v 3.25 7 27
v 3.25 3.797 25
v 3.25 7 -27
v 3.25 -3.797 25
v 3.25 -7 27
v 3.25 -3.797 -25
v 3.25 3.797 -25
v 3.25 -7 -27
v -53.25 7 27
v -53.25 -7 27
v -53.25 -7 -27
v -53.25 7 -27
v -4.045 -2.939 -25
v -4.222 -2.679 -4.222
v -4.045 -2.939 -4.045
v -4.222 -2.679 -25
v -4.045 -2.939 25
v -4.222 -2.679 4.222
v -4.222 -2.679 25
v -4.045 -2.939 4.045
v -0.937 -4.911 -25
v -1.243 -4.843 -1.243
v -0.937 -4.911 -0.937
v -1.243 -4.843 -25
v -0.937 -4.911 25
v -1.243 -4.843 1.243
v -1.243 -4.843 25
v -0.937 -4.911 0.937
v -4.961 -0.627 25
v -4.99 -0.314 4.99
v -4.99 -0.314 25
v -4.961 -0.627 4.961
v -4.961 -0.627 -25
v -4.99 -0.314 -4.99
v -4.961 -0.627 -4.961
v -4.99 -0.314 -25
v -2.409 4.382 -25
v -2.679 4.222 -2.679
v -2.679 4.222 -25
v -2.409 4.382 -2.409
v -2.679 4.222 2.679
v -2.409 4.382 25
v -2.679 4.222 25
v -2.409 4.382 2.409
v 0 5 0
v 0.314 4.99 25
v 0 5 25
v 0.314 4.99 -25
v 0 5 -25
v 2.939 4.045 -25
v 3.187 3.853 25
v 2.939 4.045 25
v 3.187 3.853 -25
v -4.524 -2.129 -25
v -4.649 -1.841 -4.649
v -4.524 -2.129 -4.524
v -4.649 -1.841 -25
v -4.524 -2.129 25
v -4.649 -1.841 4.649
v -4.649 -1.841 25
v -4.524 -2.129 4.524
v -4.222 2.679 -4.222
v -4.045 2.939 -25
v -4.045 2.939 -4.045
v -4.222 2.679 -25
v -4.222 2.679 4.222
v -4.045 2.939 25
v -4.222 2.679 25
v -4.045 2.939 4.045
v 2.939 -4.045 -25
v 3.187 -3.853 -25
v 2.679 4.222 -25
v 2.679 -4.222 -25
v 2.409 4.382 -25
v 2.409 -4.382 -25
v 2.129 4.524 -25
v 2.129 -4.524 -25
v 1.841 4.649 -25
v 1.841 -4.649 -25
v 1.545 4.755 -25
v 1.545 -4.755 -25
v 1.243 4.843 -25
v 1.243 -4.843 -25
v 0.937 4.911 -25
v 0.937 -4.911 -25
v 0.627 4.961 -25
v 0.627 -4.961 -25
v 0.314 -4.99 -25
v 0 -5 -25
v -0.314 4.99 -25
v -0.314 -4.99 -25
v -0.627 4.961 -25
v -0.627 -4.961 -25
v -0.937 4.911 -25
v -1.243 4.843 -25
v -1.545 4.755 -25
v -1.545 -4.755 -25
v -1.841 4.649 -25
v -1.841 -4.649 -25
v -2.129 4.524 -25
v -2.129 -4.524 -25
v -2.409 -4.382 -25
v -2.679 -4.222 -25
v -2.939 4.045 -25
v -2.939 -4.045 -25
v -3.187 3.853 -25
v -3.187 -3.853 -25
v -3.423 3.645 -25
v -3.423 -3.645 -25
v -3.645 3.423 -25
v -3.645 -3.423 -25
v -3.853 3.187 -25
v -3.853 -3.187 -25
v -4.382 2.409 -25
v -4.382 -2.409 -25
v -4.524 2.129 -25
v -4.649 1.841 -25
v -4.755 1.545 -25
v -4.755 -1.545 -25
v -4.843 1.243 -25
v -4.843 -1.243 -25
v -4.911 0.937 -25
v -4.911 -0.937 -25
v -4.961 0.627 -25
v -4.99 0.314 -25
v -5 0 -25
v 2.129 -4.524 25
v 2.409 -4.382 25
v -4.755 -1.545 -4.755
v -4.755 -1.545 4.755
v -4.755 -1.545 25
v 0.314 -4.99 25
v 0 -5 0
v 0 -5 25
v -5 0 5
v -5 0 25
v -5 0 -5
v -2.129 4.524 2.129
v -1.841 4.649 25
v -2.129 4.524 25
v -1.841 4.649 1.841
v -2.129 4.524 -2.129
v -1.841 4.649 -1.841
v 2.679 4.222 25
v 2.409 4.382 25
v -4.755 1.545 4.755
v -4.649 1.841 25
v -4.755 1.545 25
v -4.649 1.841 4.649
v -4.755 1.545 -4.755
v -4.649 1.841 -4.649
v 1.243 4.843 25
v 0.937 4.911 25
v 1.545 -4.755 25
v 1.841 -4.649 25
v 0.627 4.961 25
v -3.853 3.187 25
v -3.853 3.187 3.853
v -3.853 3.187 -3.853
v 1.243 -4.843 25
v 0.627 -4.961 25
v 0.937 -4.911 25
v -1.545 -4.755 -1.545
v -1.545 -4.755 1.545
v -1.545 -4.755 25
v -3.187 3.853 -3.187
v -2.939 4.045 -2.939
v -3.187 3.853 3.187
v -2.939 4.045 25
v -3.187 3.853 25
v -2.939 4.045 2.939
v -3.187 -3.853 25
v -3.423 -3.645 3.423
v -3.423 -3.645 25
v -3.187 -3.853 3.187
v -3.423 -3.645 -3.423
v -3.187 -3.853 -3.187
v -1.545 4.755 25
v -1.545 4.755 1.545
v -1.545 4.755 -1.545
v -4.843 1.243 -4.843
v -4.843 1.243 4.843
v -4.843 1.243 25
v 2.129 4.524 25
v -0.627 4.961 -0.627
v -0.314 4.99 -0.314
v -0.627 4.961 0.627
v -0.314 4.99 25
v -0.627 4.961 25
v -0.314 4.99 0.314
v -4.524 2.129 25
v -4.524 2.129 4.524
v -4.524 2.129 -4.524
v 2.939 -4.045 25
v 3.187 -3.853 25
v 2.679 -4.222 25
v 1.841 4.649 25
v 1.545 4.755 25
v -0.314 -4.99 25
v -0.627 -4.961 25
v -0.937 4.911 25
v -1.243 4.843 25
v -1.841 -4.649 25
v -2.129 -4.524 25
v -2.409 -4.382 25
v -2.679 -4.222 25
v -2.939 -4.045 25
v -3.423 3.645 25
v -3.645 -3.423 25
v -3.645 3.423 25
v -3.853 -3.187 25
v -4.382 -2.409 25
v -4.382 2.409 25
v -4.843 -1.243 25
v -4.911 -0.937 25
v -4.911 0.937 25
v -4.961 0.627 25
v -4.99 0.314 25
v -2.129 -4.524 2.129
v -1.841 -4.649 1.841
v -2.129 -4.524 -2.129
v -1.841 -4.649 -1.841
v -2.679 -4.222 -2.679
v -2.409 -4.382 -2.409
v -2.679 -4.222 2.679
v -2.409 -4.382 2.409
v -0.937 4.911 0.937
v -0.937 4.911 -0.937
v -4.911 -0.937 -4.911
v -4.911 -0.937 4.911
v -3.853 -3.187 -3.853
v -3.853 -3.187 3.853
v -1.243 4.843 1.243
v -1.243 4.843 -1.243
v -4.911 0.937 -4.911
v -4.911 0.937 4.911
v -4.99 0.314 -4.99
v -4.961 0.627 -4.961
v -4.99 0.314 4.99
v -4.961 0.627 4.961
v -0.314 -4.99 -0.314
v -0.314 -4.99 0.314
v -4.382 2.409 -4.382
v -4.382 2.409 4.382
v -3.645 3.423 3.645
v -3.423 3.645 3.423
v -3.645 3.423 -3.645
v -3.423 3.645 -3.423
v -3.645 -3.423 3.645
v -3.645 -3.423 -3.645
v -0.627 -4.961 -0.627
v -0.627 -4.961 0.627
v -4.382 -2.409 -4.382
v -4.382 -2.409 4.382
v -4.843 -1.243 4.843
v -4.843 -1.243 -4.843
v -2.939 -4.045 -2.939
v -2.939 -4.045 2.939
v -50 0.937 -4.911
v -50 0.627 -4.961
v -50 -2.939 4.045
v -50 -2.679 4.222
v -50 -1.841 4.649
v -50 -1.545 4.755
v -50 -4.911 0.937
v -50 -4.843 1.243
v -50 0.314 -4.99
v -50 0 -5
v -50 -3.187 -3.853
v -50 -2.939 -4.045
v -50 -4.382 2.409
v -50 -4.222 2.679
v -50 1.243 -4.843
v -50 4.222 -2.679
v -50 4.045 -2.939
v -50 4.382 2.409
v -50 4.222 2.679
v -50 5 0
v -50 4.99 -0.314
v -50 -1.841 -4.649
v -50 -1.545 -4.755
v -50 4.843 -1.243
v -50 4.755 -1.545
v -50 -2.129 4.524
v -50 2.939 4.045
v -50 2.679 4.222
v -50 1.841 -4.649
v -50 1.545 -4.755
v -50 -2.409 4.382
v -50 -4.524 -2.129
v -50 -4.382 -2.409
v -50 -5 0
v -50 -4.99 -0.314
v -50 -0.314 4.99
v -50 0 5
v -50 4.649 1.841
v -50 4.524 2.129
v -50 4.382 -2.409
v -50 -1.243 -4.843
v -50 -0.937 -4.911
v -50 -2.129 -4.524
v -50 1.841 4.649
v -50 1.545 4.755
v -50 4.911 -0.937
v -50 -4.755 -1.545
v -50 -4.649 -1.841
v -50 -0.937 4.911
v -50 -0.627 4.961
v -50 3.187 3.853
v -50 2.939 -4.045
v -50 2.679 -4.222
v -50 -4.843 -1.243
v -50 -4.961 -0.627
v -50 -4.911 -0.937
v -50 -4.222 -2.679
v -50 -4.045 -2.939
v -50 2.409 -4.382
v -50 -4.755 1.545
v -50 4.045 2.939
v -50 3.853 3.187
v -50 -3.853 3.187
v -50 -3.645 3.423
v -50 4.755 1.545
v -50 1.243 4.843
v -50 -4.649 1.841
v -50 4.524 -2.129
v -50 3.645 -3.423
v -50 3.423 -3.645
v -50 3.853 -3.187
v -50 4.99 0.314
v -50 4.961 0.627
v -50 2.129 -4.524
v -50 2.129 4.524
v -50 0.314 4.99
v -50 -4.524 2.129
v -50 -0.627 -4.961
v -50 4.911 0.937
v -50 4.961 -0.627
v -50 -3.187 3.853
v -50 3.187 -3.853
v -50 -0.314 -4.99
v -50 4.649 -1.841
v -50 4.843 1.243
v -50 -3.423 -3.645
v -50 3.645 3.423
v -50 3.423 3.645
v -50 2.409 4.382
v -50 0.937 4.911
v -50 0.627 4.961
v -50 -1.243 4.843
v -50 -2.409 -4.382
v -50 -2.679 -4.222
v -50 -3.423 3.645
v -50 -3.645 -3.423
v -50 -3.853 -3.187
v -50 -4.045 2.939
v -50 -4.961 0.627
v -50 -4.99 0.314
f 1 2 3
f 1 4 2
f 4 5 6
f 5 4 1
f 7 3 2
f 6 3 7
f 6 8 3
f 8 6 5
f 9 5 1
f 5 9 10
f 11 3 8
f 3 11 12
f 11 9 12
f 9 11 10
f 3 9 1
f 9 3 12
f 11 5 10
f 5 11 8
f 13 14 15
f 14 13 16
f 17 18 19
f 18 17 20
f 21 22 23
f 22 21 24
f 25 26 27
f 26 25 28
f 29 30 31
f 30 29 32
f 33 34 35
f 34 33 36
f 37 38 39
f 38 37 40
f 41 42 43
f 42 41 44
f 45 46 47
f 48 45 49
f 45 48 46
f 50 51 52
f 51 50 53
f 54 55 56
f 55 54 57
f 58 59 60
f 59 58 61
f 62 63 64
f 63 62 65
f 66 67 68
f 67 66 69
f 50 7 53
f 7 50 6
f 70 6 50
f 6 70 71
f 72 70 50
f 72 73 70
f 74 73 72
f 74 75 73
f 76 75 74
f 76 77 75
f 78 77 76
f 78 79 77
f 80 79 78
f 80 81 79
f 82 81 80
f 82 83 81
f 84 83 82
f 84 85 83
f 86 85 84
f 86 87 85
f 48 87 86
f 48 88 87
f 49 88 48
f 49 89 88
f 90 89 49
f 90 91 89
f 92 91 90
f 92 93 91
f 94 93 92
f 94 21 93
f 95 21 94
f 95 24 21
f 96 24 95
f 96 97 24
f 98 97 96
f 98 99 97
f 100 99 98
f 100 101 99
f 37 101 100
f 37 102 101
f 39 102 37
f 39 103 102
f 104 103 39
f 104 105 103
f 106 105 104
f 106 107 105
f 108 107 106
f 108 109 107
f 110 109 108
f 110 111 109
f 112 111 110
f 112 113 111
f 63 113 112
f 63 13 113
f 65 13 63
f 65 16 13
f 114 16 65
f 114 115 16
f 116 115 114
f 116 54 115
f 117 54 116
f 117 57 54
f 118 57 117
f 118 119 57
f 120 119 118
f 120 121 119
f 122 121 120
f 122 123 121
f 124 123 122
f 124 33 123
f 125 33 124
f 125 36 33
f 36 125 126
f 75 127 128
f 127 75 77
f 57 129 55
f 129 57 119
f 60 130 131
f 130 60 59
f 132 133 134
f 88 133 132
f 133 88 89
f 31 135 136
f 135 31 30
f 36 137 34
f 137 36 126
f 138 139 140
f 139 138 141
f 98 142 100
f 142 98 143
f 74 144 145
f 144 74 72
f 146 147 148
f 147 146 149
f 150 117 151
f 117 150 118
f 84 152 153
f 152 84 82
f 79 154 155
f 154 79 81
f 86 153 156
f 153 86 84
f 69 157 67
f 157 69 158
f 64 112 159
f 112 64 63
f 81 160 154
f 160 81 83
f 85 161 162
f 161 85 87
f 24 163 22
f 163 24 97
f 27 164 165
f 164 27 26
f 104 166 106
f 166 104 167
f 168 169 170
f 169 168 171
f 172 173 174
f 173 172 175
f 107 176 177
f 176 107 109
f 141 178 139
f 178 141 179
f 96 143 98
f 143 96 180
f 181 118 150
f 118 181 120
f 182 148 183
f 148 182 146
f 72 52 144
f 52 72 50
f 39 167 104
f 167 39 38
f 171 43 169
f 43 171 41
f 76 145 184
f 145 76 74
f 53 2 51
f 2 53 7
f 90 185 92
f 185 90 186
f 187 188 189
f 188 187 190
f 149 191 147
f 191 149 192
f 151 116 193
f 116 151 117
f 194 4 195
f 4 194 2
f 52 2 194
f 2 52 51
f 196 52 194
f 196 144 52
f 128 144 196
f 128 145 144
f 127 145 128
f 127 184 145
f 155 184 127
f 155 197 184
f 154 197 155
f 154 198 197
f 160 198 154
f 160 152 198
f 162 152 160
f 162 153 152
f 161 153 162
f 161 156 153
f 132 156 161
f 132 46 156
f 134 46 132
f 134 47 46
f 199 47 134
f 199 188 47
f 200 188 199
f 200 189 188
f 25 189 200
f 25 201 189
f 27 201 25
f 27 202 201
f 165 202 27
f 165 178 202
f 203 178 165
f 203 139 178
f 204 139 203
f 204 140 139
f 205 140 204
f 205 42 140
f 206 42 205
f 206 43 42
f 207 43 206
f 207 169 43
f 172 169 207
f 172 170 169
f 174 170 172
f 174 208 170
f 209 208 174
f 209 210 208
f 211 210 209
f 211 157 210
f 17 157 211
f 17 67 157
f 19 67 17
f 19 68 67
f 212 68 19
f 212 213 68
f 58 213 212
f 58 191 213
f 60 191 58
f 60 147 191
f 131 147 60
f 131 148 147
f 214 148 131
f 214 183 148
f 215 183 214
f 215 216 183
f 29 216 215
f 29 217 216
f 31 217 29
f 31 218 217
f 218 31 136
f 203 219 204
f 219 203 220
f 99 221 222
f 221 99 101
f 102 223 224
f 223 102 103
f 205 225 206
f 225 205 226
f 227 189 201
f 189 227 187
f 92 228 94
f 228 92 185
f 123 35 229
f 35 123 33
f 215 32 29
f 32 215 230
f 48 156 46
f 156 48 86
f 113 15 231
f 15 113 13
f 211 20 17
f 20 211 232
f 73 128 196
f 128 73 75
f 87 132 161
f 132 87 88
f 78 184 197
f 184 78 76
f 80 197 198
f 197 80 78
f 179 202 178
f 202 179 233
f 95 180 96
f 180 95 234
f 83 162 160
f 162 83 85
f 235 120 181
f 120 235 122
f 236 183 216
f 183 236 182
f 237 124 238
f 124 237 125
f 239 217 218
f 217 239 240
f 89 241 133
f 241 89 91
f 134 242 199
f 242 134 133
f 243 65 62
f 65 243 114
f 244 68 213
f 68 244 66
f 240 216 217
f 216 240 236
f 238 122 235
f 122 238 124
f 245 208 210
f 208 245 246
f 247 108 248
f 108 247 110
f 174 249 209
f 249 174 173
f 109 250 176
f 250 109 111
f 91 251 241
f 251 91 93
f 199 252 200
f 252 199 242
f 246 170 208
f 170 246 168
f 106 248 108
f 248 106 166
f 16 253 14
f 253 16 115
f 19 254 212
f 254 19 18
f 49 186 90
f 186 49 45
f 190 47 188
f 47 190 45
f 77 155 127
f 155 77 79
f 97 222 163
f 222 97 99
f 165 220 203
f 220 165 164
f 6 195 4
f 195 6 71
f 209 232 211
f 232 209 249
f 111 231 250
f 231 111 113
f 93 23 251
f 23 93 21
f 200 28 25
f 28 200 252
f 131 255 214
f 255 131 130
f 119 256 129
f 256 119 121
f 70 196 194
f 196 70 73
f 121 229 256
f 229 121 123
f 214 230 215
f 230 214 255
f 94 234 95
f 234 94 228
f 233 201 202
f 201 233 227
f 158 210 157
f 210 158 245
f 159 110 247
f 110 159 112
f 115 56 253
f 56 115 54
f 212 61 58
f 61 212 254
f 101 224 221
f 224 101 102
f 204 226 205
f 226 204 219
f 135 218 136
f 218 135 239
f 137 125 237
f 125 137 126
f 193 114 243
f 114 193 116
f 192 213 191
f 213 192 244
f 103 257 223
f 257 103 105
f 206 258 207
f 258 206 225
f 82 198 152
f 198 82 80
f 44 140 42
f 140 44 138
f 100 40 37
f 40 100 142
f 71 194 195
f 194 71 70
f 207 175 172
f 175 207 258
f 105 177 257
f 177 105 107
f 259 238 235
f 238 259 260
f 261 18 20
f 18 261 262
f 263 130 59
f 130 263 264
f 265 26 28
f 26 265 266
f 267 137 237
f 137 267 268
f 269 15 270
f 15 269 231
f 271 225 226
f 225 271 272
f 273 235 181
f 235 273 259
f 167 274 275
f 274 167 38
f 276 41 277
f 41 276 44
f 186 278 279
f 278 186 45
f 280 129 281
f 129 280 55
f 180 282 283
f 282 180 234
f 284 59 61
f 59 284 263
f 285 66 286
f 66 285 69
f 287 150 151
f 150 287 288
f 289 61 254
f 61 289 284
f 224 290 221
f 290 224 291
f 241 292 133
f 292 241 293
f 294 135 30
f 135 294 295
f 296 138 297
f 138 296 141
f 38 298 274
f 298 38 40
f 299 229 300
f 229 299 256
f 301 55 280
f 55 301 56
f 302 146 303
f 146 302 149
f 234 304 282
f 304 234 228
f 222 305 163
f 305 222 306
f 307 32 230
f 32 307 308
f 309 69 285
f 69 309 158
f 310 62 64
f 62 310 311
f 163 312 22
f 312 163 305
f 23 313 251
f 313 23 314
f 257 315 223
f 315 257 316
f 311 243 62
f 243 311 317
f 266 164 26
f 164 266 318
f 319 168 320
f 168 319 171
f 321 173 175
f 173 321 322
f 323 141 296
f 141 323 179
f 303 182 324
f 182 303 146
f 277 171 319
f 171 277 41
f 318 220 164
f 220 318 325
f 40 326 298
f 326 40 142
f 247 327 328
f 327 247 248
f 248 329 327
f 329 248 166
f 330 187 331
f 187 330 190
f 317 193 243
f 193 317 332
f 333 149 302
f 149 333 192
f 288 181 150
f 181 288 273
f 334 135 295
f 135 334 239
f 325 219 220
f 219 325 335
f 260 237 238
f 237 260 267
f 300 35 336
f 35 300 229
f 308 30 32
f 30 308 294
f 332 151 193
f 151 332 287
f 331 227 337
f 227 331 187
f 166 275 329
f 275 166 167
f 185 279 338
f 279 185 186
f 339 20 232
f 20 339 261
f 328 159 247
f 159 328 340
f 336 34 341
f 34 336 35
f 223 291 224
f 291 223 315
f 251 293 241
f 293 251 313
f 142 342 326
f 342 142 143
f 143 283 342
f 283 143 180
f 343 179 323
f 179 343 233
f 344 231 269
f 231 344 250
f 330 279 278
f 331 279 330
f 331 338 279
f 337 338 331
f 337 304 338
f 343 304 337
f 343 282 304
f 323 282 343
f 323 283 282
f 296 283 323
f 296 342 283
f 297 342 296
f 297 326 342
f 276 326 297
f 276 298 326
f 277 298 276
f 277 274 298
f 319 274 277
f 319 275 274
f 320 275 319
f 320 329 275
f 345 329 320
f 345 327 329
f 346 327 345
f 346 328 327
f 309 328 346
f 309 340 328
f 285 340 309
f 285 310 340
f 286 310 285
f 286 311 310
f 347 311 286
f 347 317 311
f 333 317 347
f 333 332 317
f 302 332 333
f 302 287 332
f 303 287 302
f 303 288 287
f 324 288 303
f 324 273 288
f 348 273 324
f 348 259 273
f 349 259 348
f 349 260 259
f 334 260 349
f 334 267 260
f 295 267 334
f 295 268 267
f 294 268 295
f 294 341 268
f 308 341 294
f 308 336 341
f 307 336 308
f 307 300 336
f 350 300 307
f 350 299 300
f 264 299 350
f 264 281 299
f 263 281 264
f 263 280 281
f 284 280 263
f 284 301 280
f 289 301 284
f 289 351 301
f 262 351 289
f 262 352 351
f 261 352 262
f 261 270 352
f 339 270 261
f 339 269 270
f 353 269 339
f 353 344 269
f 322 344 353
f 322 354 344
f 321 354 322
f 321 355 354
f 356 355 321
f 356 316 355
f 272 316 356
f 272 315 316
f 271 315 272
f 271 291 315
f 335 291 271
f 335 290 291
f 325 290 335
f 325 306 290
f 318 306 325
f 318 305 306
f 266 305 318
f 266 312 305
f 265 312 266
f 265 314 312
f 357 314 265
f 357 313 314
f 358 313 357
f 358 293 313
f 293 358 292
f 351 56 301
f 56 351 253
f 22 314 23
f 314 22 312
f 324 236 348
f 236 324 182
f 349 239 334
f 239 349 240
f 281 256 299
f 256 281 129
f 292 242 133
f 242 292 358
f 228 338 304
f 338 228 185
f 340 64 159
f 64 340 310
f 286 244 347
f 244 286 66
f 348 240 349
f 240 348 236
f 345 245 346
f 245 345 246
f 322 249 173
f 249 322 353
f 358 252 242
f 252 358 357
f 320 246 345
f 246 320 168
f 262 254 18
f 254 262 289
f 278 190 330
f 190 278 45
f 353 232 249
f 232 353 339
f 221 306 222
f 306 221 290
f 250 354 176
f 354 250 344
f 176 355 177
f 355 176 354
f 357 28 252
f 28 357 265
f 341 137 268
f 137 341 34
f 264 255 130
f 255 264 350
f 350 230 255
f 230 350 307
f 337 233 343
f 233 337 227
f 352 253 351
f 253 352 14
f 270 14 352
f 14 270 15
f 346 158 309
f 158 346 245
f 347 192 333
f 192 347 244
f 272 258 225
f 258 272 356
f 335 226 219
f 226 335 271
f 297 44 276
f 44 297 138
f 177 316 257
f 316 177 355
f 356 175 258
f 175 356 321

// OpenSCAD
/* 
	Supplemental T-Junction 10

*/

$fn = 100;  // Increase the resolution of the cylinders
pipe_radius = 5;
pipe_length = 50;

// Define the cube dimensions
cube_size = [pipe_length + pipe_radius/2 + 4, 2*pipe_radius + 4, pipe_length + 4];

difference() {
    // Create the cube, shifted in the negative x direction
    translate([-pipe_length/2, 0, 0])
    cube(cube_size, center=true);

    // Subtract the x-axis pipe
    translate([0, 0, 0])
    cylinder(h=pipe_length, r=pipe_radius, center=true);

    // Subtract the y-axis pipe
    rotate([0, 90, 0])
    translate([0, 0, -pipe_length/2])
    cylinder(h=pipe_length, r=pipe_radius, center=true);
}
